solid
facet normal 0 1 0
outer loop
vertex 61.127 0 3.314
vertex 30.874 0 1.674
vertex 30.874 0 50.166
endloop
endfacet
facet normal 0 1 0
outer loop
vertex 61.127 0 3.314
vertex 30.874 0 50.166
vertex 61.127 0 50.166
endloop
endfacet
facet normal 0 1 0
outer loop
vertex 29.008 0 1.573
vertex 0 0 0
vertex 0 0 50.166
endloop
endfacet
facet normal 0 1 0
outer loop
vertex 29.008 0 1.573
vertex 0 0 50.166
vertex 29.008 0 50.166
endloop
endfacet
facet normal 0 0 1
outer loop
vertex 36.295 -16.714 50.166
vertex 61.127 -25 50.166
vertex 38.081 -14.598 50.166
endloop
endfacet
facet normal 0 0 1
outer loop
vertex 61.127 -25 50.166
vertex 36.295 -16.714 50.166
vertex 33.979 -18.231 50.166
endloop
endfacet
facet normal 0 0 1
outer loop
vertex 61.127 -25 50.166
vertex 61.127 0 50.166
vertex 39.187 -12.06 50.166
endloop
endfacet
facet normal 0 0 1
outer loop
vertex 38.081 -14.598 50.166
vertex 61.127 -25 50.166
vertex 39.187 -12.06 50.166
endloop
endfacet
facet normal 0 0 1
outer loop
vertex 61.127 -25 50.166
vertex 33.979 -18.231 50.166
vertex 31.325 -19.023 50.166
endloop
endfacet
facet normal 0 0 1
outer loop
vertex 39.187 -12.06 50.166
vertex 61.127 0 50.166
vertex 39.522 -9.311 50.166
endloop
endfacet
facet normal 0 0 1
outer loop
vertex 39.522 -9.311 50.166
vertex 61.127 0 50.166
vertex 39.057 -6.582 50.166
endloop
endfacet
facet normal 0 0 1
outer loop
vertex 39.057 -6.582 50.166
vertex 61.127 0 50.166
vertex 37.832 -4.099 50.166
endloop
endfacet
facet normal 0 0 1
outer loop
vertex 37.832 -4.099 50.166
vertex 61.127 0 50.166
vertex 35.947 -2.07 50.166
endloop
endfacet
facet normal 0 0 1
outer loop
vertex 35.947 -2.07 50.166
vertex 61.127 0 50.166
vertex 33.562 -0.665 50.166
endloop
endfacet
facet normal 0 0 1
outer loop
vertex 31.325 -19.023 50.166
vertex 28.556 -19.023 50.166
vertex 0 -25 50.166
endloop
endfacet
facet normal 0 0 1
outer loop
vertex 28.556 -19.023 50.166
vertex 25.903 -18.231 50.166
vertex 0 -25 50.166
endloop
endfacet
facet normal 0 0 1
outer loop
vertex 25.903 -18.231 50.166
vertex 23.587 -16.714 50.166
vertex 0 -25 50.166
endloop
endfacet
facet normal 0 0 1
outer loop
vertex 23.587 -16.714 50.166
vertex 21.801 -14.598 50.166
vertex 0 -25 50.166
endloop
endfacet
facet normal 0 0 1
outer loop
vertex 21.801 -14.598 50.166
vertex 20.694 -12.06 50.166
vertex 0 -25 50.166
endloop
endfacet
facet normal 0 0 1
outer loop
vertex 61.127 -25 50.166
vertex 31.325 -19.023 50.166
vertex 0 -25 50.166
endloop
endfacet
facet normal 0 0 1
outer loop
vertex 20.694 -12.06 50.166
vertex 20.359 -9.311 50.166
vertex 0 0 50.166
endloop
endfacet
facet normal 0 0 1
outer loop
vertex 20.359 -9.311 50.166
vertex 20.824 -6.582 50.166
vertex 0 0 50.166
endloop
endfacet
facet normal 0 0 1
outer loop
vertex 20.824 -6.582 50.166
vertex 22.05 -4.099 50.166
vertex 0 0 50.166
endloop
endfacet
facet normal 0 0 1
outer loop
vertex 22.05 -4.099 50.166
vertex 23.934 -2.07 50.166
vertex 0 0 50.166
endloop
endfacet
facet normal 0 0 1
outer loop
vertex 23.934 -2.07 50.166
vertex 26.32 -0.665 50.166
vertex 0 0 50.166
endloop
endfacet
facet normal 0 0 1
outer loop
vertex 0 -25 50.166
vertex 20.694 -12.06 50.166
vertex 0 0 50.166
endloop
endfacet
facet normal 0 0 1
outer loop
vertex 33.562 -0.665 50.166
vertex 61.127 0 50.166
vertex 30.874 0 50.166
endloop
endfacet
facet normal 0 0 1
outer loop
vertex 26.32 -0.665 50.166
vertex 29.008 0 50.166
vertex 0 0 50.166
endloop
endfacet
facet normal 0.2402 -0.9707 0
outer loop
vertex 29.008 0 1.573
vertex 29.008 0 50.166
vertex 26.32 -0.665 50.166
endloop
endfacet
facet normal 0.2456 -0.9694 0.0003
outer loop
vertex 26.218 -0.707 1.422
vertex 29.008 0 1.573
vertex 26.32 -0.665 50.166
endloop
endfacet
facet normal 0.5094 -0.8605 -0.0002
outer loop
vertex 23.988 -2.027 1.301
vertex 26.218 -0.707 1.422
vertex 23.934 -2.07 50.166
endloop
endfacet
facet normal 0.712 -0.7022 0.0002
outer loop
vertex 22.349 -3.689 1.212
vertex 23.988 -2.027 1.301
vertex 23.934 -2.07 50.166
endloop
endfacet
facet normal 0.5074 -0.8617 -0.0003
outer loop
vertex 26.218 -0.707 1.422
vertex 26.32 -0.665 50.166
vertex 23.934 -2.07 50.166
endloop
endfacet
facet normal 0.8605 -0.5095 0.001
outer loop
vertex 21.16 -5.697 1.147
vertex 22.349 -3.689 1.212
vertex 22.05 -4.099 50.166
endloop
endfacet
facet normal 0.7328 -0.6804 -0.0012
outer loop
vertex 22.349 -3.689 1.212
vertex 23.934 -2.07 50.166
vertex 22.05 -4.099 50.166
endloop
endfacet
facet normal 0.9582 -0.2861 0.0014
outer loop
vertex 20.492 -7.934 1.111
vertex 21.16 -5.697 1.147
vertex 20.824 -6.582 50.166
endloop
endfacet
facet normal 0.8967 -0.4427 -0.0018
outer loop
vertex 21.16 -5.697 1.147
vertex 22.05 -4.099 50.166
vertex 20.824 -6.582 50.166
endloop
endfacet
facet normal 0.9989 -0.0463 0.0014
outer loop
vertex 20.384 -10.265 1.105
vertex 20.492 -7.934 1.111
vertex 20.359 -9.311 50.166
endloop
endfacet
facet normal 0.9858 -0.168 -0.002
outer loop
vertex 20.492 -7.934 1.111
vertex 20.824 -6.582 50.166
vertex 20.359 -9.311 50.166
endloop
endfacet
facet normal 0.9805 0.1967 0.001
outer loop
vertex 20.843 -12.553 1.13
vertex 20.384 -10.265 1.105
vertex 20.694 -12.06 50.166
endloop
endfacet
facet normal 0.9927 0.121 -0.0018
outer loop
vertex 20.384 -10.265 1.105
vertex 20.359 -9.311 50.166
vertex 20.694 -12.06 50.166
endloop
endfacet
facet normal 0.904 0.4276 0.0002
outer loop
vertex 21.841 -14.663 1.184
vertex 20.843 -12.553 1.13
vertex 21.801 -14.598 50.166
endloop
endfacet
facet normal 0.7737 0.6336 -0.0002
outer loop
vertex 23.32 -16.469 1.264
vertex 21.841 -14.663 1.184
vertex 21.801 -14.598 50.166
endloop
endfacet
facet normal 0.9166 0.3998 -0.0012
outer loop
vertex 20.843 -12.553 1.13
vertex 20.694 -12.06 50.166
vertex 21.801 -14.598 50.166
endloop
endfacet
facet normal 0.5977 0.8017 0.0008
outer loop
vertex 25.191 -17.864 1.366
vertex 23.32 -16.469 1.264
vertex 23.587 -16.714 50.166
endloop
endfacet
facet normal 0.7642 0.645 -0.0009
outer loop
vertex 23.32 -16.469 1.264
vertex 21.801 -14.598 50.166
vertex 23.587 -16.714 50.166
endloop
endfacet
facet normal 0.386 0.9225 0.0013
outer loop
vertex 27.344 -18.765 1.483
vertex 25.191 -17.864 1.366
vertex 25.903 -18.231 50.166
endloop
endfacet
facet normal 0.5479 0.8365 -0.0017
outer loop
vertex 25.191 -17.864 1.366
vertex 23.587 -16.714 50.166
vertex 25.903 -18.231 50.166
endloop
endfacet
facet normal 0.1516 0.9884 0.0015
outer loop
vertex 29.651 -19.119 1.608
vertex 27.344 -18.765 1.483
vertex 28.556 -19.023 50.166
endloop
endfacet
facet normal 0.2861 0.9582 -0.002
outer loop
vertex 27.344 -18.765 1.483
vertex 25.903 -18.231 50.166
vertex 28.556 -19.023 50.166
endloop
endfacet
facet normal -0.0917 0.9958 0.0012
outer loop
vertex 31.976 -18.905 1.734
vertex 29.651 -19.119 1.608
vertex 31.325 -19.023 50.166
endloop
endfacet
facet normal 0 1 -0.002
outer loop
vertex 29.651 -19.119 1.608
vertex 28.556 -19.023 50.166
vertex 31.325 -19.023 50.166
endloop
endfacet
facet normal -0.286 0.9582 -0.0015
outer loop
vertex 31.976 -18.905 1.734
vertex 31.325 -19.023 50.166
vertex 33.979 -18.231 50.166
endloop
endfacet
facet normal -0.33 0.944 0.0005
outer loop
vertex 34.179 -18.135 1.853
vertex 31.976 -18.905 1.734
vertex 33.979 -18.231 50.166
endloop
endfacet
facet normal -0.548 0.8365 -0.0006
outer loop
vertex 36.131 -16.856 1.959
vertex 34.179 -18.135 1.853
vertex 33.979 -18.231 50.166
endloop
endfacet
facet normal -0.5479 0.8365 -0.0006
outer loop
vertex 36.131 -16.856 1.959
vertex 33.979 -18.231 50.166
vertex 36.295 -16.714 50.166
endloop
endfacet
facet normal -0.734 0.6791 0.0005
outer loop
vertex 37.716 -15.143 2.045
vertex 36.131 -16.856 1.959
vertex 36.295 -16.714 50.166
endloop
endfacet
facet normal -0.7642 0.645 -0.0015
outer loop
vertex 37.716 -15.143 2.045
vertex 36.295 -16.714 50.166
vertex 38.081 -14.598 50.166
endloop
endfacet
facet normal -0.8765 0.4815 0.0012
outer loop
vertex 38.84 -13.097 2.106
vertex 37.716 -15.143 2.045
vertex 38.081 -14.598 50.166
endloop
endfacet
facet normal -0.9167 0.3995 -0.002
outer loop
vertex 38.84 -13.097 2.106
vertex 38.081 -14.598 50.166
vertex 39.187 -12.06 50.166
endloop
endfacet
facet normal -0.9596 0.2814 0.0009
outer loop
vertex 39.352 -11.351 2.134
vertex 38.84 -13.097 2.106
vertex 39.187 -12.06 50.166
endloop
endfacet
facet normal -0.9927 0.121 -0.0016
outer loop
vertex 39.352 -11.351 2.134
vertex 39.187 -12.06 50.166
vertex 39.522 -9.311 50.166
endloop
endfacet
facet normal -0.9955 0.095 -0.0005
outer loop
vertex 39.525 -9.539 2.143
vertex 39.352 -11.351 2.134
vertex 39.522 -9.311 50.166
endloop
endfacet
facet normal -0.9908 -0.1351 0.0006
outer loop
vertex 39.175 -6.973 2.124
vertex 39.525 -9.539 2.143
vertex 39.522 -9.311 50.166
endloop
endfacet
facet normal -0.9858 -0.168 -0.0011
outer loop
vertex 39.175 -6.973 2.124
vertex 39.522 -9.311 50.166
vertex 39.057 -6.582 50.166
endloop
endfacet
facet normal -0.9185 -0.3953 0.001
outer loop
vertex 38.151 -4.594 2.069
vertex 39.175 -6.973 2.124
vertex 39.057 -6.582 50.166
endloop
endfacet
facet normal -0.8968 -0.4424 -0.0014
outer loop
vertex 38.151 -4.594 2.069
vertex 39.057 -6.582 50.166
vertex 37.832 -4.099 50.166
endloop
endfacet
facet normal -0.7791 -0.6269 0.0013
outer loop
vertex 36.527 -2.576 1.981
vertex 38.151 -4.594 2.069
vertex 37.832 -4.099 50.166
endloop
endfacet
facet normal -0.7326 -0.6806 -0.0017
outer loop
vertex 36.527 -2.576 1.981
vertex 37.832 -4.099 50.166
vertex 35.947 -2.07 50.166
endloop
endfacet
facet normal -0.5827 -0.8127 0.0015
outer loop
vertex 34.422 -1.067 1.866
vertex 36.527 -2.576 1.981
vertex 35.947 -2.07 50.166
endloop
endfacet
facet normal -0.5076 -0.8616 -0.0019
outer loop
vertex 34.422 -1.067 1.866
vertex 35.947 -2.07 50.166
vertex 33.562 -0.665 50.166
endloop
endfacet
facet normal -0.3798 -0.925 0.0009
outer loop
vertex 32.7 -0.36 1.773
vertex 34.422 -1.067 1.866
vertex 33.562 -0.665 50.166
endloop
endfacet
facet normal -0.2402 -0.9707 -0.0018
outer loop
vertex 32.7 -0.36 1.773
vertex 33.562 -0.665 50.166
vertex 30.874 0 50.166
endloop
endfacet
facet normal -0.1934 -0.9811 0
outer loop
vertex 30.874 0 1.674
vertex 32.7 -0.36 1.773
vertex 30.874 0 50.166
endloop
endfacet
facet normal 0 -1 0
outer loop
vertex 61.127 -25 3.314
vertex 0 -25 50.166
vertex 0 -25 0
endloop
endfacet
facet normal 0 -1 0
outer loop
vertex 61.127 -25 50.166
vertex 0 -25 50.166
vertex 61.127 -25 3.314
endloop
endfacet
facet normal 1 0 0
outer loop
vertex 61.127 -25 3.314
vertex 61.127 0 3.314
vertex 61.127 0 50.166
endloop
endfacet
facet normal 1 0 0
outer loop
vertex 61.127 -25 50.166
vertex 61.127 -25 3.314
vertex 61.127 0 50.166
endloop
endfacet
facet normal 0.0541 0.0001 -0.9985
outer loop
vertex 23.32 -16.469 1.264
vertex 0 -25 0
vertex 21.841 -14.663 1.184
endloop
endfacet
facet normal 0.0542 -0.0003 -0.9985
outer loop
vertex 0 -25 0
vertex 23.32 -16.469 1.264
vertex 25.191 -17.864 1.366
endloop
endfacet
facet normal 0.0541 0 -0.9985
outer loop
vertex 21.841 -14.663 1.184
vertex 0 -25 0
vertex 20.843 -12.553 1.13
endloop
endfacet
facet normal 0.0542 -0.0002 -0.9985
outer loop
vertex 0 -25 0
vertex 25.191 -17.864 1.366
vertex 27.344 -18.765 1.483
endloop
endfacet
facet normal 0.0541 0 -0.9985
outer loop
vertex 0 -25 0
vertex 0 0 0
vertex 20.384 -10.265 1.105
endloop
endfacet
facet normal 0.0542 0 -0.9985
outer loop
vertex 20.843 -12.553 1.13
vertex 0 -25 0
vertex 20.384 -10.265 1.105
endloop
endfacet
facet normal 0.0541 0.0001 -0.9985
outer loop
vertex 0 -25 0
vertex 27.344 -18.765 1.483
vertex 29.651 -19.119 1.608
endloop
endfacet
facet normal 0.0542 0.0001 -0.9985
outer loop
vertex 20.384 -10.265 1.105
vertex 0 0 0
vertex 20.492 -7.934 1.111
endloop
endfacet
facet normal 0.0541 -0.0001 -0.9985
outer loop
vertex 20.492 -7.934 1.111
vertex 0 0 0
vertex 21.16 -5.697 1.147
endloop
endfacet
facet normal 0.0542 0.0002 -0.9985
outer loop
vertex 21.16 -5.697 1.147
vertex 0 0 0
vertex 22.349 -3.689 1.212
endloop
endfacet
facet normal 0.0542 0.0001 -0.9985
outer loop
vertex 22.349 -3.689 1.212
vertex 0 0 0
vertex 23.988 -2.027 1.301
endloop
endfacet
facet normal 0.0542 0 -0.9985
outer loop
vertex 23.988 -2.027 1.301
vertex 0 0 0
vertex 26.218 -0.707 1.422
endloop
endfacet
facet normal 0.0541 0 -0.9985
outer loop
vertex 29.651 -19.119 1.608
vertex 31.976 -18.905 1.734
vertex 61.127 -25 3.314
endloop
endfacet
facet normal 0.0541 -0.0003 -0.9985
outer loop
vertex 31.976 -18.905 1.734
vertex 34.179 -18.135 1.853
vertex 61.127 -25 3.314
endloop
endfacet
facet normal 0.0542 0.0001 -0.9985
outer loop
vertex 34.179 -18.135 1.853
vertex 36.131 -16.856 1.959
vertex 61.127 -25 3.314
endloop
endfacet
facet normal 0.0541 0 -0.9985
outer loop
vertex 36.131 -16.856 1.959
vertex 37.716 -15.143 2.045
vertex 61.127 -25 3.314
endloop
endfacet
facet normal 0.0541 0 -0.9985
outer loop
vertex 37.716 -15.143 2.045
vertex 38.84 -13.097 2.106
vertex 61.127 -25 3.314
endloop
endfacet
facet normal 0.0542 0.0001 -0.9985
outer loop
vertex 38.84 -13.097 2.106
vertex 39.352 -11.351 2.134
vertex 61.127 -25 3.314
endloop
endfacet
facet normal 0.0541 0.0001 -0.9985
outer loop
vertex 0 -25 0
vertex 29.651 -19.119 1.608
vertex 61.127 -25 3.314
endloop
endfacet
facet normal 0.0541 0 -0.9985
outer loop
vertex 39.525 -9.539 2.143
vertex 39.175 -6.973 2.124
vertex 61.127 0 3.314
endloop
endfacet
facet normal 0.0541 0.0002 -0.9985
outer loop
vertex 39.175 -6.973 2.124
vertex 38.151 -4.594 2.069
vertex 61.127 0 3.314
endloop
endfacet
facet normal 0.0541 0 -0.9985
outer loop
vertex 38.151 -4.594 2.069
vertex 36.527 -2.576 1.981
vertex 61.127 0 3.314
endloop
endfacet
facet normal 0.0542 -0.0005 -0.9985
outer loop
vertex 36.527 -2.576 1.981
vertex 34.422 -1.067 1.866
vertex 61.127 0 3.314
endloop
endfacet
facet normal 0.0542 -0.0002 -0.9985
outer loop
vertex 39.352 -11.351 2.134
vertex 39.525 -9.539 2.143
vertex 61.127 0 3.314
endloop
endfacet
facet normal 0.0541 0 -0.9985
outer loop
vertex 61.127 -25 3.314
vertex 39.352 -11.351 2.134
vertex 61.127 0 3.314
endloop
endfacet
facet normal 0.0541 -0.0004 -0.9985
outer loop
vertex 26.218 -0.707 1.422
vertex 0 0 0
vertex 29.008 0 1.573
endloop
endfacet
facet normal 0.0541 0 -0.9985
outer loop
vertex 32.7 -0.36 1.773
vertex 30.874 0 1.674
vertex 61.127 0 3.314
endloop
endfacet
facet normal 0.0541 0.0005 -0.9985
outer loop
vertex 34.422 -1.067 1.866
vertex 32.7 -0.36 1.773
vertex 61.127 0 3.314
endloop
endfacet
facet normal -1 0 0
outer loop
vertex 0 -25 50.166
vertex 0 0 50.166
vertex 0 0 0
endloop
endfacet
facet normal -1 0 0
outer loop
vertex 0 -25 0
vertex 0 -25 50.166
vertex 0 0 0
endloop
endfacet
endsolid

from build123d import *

# Parameters (mm, degrees)
F1_DEPTH = 25
F2_R     = 9.584307
F3_DEPTH = 60


with BuildPart() as f1:
    # F0 (on Front) → F1 (new body)
    with BuildSketch(Plane.XZ):
        Polygon((0, 50.165702), (0, 0), (61.127122, 3.314364), (61.127122, 50.165702), align=None)
    extrude(amount=F1_DEPTH)

    # F2 (on face) → F3 (cut)
    with BuildSketch(Plane.XY.offset(50.165702)):
        with Locations((29.940704, -9.538786)):
            Circle(F2_R)
    extrude(amount=-F3_DEPTH, mode=Mode.SUBTRACT)


solid = f1.part
